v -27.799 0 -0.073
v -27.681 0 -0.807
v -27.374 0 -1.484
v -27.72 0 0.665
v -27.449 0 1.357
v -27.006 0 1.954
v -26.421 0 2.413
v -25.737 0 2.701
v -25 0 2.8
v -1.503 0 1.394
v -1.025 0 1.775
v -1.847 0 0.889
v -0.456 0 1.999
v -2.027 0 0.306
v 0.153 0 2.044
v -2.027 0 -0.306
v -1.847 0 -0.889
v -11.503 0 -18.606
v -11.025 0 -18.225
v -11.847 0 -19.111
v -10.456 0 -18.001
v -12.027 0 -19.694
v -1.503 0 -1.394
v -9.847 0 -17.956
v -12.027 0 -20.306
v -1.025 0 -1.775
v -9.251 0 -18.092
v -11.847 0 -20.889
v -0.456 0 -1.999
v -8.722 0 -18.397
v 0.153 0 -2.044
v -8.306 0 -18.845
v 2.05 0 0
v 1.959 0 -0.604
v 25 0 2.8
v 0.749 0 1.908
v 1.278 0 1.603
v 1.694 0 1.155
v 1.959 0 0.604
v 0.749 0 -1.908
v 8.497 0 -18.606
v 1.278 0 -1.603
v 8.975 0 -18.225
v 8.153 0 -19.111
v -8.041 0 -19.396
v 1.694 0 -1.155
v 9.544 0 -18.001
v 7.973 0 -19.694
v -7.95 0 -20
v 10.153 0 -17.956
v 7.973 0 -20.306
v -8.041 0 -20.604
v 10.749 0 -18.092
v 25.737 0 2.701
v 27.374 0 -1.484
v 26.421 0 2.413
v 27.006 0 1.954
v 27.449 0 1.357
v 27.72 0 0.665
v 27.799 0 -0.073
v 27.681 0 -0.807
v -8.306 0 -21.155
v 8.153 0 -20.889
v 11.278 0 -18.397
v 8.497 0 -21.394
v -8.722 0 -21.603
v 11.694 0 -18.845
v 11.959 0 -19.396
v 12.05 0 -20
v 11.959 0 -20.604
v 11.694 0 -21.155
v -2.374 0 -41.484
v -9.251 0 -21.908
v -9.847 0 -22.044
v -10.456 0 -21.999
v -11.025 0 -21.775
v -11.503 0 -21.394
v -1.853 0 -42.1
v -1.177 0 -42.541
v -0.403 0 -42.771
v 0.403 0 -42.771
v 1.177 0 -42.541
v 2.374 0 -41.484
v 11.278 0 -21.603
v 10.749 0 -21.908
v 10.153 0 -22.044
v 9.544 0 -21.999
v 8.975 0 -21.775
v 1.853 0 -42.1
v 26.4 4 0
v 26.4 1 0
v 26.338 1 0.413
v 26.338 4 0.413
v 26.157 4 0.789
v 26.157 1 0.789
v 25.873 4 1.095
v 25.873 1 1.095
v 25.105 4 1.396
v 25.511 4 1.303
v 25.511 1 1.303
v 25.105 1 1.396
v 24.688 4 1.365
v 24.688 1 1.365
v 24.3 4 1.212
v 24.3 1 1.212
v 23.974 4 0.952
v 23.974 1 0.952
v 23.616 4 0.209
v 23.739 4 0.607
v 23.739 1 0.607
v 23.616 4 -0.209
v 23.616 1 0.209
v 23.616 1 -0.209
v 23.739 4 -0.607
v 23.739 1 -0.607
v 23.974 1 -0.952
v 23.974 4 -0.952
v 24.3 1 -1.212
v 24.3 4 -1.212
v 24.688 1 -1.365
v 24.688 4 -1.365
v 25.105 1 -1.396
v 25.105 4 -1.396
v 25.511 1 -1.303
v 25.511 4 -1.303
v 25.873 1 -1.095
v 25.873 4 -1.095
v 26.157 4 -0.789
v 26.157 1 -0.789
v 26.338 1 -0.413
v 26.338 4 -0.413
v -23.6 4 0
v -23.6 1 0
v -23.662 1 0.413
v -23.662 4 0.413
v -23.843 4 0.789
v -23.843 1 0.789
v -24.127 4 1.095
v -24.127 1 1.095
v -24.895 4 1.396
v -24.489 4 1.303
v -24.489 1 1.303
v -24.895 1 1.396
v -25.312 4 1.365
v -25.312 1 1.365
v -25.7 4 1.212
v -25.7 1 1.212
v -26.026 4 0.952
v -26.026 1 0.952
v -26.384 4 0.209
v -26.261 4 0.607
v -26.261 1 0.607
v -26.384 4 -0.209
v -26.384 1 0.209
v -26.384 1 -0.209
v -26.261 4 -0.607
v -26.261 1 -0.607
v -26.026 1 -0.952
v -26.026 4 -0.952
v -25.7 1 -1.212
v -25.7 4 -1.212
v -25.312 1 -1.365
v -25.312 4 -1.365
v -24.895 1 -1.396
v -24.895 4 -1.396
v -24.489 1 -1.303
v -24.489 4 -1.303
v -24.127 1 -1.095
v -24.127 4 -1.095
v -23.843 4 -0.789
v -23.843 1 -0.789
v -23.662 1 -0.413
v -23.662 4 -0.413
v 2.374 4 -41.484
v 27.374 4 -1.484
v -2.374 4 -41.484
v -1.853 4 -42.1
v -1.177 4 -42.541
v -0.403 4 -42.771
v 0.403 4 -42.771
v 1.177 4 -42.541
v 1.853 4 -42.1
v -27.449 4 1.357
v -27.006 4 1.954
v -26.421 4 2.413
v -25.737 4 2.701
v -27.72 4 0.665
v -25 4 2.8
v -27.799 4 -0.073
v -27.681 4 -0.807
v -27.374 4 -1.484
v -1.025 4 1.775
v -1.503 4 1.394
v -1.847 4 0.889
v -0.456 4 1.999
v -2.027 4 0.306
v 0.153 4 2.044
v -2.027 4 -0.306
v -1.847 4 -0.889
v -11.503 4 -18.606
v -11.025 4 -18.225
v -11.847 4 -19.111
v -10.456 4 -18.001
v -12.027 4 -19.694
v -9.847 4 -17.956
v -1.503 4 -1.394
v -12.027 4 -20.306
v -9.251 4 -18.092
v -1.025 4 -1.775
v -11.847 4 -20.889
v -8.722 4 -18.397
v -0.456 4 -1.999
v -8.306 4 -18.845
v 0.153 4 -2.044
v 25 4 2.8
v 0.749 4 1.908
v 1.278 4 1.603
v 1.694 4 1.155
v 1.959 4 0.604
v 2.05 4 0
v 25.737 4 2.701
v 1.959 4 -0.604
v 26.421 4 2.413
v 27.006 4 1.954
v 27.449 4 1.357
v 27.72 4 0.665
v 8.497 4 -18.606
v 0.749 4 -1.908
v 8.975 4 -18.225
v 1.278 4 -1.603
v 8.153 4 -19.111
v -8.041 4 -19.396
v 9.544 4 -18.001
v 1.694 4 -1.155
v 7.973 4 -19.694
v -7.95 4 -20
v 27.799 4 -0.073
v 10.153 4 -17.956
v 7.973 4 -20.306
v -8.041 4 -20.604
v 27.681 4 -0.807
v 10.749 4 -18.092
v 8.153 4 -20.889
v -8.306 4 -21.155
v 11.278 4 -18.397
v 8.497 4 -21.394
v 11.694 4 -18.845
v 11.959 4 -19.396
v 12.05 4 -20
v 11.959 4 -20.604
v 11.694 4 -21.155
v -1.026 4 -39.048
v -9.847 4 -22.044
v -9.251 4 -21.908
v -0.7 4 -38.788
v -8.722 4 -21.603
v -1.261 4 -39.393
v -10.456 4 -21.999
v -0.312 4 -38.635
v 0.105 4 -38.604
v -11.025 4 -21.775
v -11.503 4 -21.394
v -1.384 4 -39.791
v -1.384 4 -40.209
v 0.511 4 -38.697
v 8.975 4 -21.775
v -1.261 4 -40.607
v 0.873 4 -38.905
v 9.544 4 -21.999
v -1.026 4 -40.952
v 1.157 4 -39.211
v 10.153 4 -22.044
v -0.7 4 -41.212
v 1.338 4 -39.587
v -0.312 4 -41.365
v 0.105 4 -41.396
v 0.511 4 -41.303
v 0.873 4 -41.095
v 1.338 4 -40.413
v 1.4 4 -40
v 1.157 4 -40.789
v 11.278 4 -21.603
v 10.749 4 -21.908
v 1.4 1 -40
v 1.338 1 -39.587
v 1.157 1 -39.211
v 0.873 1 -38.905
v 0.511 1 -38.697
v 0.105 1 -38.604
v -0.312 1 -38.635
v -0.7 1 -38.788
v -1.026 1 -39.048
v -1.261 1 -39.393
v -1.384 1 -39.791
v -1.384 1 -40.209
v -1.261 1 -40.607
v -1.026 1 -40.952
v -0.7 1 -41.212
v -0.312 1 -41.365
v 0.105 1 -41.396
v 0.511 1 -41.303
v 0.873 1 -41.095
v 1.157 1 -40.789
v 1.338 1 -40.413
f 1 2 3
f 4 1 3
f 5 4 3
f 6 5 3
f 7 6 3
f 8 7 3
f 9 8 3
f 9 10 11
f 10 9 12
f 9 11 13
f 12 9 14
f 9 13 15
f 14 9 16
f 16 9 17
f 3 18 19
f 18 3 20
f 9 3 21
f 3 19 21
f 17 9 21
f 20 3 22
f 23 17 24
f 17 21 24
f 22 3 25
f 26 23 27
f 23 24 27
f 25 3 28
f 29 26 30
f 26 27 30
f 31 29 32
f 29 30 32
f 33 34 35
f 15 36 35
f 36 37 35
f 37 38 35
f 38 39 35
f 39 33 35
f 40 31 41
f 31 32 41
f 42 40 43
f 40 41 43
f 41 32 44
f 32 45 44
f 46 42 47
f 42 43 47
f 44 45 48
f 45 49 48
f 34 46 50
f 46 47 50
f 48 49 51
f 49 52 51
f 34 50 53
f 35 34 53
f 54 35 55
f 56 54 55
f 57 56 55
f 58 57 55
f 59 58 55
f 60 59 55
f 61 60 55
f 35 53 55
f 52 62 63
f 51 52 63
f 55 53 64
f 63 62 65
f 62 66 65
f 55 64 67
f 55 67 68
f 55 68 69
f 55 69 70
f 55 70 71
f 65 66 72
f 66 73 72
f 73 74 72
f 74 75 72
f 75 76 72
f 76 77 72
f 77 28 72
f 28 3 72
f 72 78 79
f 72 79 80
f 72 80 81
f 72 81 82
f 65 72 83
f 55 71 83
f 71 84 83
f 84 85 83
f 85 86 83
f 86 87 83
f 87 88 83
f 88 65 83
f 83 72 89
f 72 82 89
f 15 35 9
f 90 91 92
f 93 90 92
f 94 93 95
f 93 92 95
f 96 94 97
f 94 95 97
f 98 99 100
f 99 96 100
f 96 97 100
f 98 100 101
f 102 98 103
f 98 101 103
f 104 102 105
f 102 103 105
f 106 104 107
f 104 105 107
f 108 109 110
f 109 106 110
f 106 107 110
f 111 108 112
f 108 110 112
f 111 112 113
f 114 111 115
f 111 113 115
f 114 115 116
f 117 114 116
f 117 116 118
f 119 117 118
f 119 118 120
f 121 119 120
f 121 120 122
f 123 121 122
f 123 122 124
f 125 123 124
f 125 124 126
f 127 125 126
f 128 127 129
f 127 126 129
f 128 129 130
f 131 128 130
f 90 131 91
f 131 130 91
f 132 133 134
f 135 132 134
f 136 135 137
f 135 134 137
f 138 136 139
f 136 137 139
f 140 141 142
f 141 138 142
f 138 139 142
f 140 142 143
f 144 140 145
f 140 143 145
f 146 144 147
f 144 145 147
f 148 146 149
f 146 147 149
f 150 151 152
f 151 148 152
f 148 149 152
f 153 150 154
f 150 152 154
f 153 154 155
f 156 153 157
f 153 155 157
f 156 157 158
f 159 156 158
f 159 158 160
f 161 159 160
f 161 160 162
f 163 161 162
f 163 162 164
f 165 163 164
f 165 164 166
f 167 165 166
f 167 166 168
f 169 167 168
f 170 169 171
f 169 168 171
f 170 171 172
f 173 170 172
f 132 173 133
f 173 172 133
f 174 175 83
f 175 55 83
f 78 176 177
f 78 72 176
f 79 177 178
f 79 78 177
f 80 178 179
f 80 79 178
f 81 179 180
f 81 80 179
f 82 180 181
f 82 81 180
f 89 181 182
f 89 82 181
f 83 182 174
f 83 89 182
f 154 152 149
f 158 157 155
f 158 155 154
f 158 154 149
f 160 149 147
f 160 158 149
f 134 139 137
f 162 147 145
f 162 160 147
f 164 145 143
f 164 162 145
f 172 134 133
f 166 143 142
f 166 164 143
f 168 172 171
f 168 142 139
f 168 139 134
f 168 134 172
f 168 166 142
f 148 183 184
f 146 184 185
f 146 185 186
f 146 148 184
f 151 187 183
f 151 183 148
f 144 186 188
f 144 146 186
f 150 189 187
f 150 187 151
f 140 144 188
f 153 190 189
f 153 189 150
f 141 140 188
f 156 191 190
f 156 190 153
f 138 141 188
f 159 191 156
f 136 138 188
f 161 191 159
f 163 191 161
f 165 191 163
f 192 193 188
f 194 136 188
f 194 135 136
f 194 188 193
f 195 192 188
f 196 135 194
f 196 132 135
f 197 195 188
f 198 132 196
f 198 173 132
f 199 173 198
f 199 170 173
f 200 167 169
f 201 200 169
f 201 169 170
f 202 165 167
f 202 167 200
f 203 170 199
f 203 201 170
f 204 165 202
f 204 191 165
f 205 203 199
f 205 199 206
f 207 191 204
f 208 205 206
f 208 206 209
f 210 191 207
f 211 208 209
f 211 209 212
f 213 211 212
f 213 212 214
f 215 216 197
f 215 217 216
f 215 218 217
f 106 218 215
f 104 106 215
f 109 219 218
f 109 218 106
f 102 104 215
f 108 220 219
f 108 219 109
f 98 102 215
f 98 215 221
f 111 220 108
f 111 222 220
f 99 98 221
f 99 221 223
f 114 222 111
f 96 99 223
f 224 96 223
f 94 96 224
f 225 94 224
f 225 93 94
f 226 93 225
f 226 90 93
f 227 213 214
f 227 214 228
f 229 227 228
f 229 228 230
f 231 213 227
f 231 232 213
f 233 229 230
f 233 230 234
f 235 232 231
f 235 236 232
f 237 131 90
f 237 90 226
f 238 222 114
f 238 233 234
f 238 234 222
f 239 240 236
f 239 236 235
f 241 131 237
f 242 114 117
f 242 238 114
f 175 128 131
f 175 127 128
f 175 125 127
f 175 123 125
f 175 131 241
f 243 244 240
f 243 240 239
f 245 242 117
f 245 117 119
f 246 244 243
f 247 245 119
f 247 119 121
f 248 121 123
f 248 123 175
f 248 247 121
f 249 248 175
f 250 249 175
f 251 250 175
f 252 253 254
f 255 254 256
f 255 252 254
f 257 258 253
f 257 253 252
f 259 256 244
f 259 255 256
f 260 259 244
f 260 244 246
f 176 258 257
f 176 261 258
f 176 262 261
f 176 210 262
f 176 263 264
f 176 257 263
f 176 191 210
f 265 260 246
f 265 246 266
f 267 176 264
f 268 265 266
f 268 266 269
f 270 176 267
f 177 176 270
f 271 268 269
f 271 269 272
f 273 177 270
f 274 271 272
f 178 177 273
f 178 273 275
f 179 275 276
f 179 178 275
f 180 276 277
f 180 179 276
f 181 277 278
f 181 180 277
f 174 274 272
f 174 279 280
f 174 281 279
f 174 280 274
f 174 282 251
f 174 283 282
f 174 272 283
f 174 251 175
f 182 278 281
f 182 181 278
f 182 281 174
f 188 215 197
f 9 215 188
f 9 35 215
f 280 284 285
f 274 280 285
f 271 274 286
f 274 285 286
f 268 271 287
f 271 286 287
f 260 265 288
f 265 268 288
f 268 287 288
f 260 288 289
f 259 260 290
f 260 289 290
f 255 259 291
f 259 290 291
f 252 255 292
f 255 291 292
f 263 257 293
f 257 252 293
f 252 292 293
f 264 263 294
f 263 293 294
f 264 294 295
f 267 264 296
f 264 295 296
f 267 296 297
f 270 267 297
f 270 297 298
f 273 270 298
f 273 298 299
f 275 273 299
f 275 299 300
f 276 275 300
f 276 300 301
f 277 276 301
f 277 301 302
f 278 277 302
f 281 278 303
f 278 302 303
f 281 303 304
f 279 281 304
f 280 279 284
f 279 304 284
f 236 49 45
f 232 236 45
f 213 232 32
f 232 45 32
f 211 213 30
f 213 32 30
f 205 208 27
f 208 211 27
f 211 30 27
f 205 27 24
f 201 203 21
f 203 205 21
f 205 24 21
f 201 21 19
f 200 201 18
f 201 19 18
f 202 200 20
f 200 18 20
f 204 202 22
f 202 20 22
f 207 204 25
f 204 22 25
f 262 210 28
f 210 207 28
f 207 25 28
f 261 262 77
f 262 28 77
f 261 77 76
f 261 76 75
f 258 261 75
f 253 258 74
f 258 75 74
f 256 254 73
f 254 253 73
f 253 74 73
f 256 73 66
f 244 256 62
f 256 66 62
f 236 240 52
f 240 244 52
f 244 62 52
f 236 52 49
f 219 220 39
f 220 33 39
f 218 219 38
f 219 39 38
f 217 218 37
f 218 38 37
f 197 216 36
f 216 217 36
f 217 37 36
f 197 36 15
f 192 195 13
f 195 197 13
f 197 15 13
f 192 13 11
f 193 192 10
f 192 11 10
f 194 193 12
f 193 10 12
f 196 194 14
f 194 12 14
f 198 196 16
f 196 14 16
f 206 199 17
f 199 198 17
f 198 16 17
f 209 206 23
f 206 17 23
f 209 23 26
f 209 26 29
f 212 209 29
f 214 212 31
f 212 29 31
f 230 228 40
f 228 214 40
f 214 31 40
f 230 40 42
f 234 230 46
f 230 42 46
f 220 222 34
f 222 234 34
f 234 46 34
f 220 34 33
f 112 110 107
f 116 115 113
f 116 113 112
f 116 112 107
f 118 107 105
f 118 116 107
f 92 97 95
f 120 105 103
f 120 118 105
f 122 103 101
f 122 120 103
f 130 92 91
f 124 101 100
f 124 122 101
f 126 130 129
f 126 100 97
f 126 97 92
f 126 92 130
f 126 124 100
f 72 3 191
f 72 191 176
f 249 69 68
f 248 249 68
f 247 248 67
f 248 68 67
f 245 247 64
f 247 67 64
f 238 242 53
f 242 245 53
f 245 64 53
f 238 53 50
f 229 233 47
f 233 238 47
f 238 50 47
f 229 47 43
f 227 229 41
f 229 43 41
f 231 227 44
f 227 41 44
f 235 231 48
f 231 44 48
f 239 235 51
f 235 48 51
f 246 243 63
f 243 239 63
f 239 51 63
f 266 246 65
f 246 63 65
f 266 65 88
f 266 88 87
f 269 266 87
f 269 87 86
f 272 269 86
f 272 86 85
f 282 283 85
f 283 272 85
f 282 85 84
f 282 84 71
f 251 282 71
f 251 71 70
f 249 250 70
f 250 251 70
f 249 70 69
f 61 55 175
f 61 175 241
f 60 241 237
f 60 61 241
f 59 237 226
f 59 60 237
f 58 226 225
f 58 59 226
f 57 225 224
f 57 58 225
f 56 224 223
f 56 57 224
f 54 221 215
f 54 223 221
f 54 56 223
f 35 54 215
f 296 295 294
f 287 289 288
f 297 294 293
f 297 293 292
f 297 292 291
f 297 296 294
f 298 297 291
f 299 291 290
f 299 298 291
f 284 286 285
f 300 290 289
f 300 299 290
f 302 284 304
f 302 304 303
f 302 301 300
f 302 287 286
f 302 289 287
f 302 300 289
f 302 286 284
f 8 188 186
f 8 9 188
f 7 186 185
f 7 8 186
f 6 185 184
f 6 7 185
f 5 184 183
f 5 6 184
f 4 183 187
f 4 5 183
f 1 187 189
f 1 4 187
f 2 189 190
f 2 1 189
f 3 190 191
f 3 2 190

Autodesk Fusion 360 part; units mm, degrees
sketch "Sketch1" plane through (0, 0, 0) normal (0, 1, 0) x (1, 0, 0)
  circle A0 centre (0, 40) radius 1.4
  circle A1 centre (-25, 0) radius 1.4
  circle A2 centre (25, 0) radius 1.4
  line L0 (-25, 0) -> (25, 0) construction
  line L1 (0, 0) -> (0, 40) construction
  line L2 (-27.3744, 1.484) -> (-2.3744, 41.484)
  line L3 (25, -2.8) -> (-25, -2.8)
  line L4 (27.3744, 1.484) -> (2.3744, 41.484)
  arc A3 (25, -2.8) -> (27.3744, 1.484) centre (25, 0) ccw
  arc A4 (-27.3744, 1.484) -> (-25, -2.8) centre (-25, 0) ccw
  arc A5 (2.3744, 41.484) -> (-2.3744, 41.484) centre (0, 40) ccw
  circle A6 centre (-10, 20) radius 2.05
  circle A7 centre (10, 20) radius 2.05
  circle A8 centre (0, 0) radius 2.05
  line L5 (0, 0) -> (0, -2.8) construction
  circle A9 centre (0, 12.5) radius 3.5
  line L6 (0, 12.5) -> (-10, 20) construction
  line L7 (0, 12.5) -> (0, 0) construction
  dimension "d16" = 2.8
  dimension "d19" = 50
  dimension "d21" = 40
  dimension "d22" = 1.4
  dimension "d23" = 1.4
  dimension "d24" = 4.1
  dimension "d28" = 7
  dimension "d36" = 20
  dimension "d37" = 10
extrude "Extrude1" add sketch "Sketch1" along normal blind 4 contours L2 L3 L4 A3 A4 A5 | A9 makes body 1
extrude "Extrude2" add sketch "Sketch1" along normal blind 7.5 separate body contours A0 | A1 | A2 | L2 L3 L4 A3 A4 A5 makes body 2
extrude "Extrude3" add sketch "Sketch1" along normal blind 1 contours A0 | A1 | A2 bodies 1
extrude "Extrude5" add sketch "Sketch1" along normal blind 1 contours A6 | A7 | A8 bodies 2
extrude "Extrude6" add sketch "Sketch1" along normal blind 5 separate body contours L2 L3 L4 A3 A4 A5 | A6 | A7 | A8 | A9 makes body 3
hidden bodies 2 3
equation "holeDiam = 2.8 mm"
equation "RodHoleDiam = 4.1 mm"
equation "d16 = holeDiam"
equation "d22 = holeDiam / 2"
equation "d23 = holeDiam / 2"
equation "d24 = RodHoleDiam"
